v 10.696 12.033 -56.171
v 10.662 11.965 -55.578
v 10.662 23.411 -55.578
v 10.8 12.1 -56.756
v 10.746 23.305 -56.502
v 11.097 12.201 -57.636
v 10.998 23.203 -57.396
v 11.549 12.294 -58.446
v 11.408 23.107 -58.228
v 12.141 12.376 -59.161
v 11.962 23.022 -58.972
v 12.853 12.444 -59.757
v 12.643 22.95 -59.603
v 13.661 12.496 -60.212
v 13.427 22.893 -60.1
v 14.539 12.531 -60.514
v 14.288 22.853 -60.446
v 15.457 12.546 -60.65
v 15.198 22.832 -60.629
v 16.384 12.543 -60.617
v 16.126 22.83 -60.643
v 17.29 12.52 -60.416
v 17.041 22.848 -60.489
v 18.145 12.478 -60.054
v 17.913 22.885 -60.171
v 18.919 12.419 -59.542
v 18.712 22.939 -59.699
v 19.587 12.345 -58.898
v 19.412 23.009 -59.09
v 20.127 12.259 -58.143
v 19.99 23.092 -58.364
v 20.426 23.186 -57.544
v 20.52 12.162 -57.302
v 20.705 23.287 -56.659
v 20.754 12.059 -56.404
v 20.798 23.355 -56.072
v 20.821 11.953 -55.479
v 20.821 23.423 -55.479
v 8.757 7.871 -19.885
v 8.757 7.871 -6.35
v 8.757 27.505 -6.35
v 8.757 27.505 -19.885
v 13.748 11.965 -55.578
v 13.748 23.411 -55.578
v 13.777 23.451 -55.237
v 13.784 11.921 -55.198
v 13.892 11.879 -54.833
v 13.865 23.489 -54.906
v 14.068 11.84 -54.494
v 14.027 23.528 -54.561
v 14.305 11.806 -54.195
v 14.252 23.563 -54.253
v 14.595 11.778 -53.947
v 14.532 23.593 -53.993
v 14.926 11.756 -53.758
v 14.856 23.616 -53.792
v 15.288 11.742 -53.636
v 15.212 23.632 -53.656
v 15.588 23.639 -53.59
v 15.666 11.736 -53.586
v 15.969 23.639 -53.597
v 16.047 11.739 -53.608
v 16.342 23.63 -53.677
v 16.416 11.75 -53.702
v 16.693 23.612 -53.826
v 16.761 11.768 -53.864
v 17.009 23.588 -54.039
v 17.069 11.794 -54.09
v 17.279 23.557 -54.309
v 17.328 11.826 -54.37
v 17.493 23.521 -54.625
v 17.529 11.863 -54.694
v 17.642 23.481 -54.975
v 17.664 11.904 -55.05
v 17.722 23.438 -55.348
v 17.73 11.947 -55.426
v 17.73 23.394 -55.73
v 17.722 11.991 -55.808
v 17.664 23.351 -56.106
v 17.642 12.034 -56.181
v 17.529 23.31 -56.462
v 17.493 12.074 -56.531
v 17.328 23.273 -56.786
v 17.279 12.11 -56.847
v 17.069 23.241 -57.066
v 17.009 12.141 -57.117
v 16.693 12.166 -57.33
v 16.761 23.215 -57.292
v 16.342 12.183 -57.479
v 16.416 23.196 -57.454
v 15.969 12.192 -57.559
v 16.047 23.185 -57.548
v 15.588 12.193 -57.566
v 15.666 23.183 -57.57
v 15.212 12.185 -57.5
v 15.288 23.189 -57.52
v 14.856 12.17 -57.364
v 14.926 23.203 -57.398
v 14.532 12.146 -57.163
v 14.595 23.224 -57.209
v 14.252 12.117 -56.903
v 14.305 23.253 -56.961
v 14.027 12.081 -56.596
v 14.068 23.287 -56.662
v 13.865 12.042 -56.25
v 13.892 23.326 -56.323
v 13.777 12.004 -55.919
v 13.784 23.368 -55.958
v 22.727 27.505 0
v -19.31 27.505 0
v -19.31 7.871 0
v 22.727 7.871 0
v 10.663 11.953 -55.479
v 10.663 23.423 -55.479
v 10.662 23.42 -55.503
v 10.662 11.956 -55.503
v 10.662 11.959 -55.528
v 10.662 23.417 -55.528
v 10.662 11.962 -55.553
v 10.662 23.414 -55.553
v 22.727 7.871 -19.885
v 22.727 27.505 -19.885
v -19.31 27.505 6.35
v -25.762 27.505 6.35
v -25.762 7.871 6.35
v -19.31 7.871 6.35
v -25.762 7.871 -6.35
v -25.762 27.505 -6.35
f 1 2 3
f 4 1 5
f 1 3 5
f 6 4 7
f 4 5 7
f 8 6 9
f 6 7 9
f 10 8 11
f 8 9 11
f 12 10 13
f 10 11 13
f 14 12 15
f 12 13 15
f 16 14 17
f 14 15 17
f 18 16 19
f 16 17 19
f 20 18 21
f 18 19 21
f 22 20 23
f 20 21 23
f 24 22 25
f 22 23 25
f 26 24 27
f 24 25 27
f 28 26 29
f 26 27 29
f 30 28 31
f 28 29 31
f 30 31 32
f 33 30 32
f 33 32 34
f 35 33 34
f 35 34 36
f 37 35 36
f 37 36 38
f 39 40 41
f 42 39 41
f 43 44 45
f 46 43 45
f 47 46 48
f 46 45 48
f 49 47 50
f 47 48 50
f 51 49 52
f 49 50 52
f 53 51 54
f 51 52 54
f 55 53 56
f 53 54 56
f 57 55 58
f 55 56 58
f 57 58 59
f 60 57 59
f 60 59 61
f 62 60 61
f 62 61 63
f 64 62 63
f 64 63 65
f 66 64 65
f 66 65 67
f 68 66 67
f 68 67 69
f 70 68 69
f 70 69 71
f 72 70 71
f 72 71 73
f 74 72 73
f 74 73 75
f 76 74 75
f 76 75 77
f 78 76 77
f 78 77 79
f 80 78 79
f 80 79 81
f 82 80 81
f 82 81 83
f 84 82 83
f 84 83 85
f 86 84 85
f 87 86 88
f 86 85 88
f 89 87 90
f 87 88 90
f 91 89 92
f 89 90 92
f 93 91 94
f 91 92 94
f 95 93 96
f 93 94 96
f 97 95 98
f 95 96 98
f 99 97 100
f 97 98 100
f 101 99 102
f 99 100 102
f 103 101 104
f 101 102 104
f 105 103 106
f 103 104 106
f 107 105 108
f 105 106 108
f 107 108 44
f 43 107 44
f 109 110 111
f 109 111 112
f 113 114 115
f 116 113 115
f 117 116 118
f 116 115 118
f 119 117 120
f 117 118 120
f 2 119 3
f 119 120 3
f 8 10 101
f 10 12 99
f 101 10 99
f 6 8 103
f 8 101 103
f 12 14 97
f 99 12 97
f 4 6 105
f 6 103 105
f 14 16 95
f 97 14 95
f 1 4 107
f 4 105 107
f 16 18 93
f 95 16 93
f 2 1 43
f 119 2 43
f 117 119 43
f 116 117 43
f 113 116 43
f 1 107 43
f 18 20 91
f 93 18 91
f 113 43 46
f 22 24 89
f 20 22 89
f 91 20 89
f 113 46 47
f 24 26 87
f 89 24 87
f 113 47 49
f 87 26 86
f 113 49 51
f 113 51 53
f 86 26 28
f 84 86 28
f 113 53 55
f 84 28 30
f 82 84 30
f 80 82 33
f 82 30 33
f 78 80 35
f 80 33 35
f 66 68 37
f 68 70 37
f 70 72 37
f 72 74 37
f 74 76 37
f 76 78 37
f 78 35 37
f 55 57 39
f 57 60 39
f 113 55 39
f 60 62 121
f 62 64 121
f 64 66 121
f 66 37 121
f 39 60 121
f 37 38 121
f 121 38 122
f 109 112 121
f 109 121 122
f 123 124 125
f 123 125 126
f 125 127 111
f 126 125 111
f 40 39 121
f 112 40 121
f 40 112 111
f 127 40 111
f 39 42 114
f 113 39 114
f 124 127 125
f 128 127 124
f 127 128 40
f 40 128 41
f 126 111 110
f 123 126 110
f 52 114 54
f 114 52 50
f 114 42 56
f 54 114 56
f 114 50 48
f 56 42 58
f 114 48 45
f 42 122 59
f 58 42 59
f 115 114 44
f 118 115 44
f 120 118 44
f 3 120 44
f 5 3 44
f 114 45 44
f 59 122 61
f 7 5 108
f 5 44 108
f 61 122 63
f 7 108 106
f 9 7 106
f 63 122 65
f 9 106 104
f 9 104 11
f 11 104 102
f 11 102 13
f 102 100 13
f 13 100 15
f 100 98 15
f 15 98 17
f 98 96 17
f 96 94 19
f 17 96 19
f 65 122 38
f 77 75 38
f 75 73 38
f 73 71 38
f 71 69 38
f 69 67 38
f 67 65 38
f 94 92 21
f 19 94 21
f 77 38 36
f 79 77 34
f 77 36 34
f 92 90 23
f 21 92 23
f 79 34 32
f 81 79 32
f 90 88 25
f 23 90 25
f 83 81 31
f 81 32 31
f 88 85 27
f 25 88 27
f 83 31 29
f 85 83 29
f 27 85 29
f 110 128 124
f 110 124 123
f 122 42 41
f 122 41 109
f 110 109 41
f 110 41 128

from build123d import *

# Parameters (mm, degrees)
F0_W     = 6.4516
F0_H     = 19.6342
F0_W_2   = 28.067
F0_W_3   = 13.97
F1_DEPTH = 6.35
F2_DEPTH = 6.35
F3_DEPTH = 60.96
F5_DEPTH = 19.6352
F4_R     = 1.9939
F6_DEPTH = 19.6352
F8_DEPTH = 48.4896


with BuildPart() as f1:
    # F0 (on Top) → F1 (new body)
    with BuildSketch(Plane.XY):
        with Locations((-22.536153, 17.688083)):
            Rectangle(F0_W, F0_H)
        with Locations((-5.276853, 17.688083)):
            Rectangle(F0_W_2, F0_H)
        with Locations((15.741647, 17.688083)):
            Rectangle(F0_W_3, F0_H)
    extrude(amount=-F1_DEPTH)

    # F0 (on Top) → F2 (join)
    with BuildSketch(Plane.XY):
        with Locations((-22.536153, 17.688083)):
            Rectangle(F0_W, F0_H)
    extrude(amount=F2_DEPTH)

    # F0 (on Top) → F3 (join)
    with BuildSketch(Plane.XY):
        with Locations((15.741647, 17.688083)):
            Rectangle(F0_W_3, F0_H)
    extrude(amount=-F3_DEPTH)

    # F4 (on face) → F5 (cut, through all)
    with BuildSketch(Plane(origin=(0, 27.505183, 0), x_dir=(-1, 0, 0), z_dir=(0, 1, 0))):
        with BuildLine():
            ThreePointArc((-10.662622, -55.478505), (-10.66189, -55.528265), (-10.661647, -55.578031))
            ThreePointArc((-10.661647, -55.578031), (-15.791412, -60.657787), (-20.820672, -55.478505))
            Line((-20.820672, -55.478505), (-22.726647, -19.884773))
            Line((-22.726647, -19.884773), (-22.726647, -60.96))
            Line((-22.726647, -60.96), (-8.756647, -60.96))
            Line((-8.756647, -60.96), (-8.756647, -19.884773))
            Line((-8.756647, -19.884773), (-10.662622, -55.478505))
        make_face()
    extrude(amount=-F5_DEPTH, mode=Mode.SUBTRACT)

    # F4 (on face) → F6 (cut, through all)
    with BuildSketch(Plane(origin=(0, 27.505183, 0), x_dir=(-1, 0, 0), z_dir=(0, 1, 0))):
        with Locations((-15.741647, -55.578031)):
            Circle(F4_R)
    extrude(amount=-F6_DEPTH, mode=Mode.SUBTRACT)

    # F7 (on face) → F8 (cut, through all)
    with BuildSketch(Plane.YZ.offset(22.726647)):
        Polygon((22.828814, -60.658031), (27.505183, -60.658031), (27.505183, -55.478505), (27.505183, -19.884773), align=None)
        Polygon((7.870983, -60.658031), (12.547351, -60.658031), (7.870983, -19.884773), (7.870983, -55.478505), align=None)
    extrude(amount=-F8_DEPTH, mode=Mode.SUBTRACT)


solid = f1.part
